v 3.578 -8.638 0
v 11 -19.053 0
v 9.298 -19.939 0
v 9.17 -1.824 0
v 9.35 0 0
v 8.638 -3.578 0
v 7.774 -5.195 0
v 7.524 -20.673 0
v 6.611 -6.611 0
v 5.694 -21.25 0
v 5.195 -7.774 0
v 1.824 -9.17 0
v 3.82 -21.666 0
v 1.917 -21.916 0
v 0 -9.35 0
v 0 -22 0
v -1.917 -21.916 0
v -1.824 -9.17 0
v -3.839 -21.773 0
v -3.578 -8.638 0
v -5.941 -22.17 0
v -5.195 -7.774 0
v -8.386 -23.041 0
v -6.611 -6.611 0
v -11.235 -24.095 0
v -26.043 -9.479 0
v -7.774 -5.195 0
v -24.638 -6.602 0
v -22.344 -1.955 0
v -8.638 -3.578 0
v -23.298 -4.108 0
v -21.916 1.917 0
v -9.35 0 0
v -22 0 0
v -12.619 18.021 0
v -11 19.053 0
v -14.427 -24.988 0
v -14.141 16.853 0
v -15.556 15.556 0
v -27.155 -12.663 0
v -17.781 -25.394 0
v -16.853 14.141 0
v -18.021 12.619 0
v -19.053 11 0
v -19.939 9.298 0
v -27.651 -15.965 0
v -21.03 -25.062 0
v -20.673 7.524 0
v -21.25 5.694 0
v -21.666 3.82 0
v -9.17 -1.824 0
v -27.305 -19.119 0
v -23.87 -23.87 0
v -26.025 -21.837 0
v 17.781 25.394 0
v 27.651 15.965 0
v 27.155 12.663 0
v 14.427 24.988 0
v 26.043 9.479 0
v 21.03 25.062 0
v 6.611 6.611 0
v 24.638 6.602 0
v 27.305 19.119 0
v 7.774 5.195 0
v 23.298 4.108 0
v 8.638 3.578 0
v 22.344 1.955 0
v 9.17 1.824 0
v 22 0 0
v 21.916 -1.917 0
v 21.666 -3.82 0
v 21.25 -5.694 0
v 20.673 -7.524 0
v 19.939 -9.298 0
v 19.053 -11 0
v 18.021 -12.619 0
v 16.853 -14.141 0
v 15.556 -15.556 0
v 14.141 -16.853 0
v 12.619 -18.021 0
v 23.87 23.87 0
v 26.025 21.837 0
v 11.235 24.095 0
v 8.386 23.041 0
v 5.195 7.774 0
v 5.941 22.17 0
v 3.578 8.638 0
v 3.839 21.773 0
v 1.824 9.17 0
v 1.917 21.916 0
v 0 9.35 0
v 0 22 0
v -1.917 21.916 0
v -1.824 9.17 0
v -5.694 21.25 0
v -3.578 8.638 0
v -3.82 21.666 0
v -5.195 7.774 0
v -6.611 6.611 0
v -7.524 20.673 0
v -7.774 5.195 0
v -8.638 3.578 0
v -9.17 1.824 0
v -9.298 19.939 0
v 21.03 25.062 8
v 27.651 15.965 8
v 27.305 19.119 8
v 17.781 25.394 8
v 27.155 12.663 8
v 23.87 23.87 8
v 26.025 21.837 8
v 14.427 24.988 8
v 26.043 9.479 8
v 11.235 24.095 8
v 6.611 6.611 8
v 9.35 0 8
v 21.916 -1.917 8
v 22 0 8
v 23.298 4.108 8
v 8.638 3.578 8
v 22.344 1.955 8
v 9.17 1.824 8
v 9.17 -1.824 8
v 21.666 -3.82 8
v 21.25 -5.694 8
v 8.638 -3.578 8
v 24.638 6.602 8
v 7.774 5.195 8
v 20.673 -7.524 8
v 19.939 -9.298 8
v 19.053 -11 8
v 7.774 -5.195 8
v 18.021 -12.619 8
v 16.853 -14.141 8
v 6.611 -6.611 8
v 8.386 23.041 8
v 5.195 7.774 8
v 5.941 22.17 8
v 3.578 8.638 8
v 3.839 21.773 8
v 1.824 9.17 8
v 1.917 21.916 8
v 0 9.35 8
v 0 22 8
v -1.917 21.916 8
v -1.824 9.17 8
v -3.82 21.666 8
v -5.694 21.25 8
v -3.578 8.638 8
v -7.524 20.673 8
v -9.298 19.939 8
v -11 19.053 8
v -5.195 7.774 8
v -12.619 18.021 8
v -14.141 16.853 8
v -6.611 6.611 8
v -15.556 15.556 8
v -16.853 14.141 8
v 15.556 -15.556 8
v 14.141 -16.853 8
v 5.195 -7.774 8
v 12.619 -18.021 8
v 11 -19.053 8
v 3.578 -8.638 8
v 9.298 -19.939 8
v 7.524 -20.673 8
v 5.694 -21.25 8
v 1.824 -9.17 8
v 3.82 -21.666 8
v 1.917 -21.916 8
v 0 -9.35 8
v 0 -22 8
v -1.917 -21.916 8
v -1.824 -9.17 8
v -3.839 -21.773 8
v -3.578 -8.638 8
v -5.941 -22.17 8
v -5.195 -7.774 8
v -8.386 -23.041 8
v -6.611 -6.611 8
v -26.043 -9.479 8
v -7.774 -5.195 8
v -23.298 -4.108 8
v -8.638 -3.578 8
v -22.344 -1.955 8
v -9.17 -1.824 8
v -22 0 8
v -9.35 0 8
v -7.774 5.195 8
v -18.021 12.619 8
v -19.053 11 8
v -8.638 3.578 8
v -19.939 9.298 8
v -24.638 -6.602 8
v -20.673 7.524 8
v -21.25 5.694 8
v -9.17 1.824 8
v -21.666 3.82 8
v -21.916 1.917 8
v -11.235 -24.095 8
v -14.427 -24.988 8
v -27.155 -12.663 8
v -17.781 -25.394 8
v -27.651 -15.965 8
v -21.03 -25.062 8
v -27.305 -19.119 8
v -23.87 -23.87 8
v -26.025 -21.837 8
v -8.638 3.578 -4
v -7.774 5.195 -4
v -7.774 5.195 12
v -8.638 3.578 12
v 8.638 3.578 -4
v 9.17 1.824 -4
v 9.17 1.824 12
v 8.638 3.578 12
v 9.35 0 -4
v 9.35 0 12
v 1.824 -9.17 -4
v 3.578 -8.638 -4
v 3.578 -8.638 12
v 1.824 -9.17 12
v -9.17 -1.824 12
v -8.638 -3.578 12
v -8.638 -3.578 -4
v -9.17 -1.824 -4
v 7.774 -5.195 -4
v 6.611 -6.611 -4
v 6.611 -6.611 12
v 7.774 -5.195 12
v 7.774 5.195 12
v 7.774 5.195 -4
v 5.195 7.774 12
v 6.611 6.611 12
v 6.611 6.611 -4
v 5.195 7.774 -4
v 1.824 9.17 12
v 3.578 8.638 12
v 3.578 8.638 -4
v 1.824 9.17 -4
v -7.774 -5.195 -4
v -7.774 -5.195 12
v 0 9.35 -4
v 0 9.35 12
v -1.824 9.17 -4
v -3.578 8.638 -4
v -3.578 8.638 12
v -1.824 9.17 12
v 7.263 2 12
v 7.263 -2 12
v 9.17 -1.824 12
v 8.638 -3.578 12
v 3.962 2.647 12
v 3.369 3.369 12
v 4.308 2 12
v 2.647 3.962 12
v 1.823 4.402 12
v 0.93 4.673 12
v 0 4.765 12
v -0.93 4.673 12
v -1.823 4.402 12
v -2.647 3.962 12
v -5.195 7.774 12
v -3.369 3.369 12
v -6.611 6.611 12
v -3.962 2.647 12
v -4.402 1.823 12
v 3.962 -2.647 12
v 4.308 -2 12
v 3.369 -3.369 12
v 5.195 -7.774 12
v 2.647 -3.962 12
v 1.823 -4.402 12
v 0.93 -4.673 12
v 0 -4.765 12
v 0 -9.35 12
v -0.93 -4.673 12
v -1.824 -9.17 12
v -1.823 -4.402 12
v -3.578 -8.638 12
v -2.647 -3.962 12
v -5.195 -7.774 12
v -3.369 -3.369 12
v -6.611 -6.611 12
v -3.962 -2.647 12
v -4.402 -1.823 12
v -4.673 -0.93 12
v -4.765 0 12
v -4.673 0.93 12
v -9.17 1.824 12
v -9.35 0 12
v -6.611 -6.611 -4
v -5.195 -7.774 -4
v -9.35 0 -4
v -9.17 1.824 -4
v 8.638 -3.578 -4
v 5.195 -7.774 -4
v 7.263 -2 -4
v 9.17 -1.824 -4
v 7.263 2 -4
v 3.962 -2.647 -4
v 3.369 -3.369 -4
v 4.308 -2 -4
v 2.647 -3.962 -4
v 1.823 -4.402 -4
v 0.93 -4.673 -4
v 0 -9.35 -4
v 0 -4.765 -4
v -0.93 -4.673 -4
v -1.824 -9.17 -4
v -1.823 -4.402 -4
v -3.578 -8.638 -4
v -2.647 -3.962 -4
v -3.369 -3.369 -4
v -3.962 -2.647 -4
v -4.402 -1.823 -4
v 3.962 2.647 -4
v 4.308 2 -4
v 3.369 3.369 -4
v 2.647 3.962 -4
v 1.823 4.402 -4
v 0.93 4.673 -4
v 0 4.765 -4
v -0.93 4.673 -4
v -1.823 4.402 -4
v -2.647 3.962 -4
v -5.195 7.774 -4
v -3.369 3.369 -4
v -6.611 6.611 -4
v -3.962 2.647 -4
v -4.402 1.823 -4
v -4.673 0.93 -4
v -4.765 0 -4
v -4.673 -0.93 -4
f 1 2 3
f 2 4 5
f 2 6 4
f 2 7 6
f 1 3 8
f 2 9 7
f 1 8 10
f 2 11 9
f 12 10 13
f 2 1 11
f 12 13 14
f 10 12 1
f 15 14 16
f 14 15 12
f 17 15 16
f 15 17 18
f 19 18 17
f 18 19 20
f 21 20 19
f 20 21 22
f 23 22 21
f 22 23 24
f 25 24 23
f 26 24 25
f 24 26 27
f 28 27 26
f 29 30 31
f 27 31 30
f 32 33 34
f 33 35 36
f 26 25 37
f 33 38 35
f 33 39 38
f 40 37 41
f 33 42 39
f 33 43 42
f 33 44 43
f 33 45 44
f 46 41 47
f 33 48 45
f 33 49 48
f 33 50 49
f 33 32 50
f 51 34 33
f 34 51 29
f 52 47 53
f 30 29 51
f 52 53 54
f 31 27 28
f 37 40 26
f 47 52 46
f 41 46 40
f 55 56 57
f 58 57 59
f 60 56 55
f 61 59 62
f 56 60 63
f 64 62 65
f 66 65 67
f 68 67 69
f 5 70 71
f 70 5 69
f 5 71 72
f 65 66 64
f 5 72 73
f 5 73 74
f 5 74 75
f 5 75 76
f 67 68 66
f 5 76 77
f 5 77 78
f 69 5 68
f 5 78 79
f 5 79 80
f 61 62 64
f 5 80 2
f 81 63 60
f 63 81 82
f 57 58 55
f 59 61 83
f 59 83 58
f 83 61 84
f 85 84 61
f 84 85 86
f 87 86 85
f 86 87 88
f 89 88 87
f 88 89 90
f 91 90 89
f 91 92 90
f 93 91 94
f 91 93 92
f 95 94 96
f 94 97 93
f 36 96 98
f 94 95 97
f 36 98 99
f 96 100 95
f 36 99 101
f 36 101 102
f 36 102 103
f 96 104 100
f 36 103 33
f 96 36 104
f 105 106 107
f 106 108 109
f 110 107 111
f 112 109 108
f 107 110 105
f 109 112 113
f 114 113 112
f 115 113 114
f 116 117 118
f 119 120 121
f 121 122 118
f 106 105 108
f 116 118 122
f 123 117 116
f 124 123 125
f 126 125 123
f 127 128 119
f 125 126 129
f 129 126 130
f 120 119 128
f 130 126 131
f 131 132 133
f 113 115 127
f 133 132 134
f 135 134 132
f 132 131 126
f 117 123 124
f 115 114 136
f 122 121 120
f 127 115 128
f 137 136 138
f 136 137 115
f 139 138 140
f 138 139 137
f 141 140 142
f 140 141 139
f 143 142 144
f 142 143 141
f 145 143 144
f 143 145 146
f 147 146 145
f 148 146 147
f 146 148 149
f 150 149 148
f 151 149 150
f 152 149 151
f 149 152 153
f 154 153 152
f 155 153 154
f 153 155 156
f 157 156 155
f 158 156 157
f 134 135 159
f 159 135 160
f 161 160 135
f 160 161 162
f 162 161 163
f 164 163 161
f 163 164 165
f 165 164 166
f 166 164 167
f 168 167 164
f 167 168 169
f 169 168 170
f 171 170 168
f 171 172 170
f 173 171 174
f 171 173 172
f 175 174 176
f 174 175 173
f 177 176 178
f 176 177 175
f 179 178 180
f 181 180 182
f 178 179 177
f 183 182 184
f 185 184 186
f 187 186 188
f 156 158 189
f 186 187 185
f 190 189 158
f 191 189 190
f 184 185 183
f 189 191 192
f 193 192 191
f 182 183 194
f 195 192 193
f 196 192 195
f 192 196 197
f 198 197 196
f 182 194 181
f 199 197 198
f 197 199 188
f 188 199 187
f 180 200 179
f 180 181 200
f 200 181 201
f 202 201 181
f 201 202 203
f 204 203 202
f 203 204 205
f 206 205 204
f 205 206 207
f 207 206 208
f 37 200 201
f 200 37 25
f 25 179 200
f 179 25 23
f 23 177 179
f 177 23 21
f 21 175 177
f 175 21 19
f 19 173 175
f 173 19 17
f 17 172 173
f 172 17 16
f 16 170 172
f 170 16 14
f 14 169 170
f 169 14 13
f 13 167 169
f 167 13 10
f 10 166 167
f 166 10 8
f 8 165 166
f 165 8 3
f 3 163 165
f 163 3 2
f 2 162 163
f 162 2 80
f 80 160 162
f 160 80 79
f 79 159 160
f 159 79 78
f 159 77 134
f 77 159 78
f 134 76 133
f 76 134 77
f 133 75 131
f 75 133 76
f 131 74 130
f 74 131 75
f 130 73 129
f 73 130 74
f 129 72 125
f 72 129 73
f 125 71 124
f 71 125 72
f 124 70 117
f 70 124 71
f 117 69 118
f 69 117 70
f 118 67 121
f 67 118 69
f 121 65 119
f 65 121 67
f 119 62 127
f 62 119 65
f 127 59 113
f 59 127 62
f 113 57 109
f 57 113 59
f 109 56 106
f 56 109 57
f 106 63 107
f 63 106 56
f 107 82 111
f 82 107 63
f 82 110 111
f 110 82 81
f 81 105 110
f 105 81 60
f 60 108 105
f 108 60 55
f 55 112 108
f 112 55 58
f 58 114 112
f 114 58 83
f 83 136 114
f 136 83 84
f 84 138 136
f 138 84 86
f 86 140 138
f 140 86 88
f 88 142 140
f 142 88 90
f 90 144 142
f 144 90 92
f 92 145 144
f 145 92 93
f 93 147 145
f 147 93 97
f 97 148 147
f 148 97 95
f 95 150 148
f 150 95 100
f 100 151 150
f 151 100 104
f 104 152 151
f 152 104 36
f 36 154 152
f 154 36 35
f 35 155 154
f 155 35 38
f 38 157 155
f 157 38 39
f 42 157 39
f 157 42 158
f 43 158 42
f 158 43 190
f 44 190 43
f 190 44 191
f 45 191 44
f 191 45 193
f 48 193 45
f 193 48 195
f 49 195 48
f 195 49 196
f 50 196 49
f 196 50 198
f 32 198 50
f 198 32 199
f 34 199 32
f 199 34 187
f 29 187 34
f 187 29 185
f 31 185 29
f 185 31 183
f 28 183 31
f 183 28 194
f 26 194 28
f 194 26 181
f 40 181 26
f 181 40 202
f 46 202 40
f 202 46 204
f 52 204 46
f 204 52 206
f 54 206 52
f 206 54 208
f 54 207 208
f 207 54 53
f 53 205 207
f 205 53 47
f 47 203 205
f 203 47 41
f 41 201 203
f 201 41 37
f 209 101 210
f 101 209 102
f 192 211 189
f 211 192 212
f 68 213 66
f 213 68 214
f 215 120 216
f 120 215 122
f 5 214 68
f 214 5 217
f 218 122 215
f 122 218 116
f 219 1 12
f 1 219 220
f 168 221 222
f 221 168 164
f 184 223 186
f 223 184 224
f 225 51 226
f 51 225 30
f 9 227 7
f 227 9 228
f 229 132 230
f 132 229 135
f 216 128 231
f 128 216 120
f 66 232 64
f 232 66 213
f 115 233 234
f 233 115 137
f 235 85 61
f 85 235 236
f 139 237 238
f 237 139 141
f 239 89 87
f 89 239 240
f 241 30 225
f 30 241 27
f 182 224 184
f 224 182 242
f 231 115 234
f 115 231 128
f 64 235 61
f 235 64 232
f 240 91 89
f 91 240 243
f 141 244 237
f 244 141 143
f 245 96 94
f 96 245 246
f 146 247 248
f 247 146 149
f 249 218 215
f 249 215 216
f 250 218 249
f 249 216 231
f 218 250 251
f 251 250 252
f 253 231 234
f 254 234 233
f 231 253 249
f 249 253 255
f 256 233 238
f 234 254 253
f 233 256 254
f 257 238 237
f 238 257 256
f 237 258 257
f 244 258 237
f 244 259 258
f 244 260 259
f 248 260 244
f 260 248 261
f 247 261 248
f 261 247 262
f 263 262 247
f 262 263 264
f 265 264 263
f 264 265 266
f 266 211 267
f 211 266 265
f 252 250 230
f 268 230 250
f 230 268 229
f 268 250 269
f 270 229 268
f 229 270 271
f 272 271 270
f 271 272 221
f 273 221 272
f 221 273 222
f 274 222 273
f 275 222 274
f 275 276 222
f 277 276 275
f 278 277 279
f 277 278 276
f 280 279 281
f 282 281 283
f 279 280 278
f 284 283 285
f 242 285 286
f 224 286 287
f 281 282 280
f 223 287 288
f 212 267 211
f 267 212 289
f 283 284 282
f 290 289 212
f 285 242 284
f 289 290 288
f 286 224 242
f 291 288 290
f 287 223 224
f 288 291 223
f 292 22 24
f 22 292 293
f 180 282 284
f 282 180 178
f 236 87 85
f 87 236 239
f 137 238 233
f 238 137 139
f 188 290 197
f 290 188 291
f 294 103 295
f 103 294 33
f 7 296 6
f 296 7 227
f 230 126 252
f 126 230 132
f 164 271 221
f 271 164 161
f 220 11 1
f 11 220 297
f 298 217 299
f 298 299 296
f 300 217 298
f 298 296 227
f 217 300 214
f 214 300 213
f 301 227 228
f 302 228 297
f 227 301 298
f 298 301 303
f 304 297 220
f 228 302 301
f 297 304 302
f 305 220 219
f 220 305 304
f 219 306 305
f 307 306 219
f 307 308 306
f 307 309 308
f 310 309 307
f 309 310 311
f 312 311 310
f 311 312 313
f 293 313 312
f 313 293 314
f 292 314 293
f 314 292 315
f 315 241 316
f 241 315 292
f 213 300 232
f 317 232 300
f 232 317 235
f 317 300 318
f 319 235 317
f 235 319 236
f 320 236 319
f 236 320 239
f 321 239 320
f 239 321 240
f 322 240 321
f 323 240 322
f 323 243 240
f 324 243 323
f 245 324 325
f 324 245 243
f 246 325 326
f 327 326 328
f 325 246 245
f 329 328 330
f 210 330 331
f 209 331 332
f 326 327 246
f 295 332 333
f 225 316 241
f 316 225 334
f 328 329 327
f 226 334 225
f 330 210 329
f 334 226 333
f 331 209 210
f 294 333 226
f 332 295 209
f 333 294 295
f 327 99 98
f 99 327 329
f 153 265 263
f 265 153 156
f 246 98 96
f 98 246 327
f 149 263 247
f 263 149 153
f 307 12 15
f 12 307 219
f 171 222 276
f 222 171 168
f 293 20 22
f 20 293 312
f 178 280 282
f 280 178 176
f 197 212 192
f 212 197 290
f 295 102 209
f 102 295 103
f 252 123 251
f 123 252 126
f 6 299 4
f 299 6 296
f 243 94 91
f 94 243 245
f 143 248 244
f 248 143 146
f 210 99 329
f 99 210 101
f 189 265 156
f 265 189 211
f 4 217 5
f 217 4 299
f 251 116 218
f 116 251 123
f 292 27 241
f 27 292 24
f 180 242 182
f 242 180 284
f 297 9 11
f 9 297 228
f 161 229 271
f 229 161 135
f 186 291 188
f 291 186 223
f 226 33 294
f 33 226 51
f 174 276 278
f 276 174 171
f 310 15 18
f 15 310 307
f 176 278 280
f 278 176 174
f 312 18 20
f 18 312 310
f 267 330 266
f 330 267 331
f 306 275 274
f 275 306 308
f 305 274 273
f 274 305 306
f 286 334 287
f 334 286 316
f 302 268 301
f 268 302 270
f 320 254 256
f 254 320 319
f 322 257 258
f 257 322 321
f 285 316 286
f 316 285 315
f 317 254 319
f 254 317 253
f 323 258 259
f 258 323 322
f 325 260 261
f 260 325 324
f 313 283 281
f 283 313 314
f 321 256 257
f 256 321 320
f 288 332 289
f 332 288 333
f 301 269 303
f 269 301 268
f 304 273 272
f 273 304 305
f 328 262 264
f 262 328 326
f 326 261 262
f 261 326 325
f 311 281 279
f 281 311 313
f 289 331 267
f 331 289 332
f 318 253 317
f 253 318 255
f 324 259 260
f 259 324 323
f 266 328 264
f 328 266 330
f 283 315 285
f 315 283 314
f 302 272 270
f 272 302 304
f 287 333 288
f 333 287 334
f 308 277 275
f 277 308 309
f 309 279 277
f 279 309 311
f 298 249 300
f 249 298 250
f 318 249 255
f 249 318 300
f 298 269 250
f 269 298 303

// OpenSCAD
$fn = 32;

// ----------------------------------------------------------------------
// Cam: base radius 22 mm with a 12 mm lift over 150 degrees
// ----------------------------------------------------------------------

// --- parameters (mm) ---
base_r = 22;              // base radius
lift = 12;                // lift height above the base radius
lift_span = 150;          // angular width of the lift
lift_start = 0;           // angle where the lift starts
cam_t = 8;                // cam plate thickness
hub_d = 18.7;             // hub diameter
hub_h = 16;               // hub height
bore_d = 9.53;            // bore
key_w = 4;                // keyway width
key_depth = 2;            // keyway depth

cam_profile = [[22, 0], [22.344, 1.955], [23.298, 4.108], [24.638, 6.602], [26.043, 9.479], [27.155, 12.663], [27.651, 15.965], [27.305, 19.119], [26.025, 21.837], [23.87, 23.87], [21.03, 25.062], [17.781, 25.394], [14.427, 24.988], [11.235, 24.095], [8.386, 23.041], [5.941, 22.17], [3.839, 21.773], [1.917, 21.916], [0, 22], [-1.917, 21.916], [-3.82, 21.666], [-5.694, 21.25], [-7.524, 20.673], [-9.298, 19.939], [-11, 19.053], [-12.619, 18.021], [-14.141, 16.853], [-15.556, 15.556], [-16.853, 14.141], [-18.021, 12.619], [-19.053, 11], [-19.939, 9.298], [-20.673, 7.524], [-21.25, 5.694], [-21.666, 3.82], [-21.916, 1.917], [-22, 0], [-22.344, -1.955], [-23.298, -4.108], [-24.638, -6.602], [-26.043, -9.479], [-27.155, -12.663], [-27.651, -15.965], [-27.305, -19.119], [-26.025, -21.837], [-23.87, -23.87], [-21.03, -25.062], [-17.781, -25.394], [-14.427, -24.988], [-11.235, -24.095], [-8.386, -23.041], [-5.941, -22.17], [-3.839, -21.773], [-1.917, -21.916], [0, -22], [1.917, -21.916], [3.82, -21.666], [5.694, -21.25], [7.524, -20.673], [9.298, -19.939], [11, -19.053], [12.619, -18.021], [14.141, -16.853], [15.556, -15.556], [16.853, -14.141], [18.021, -12.619], [19.053, -11], [19.939, -9.298], [20.673, -7.524], [21.25, -5.694], [21.666, -3.82], [21.916, -1.917]];

difference() {
  union() {
    linear_extrude(height = cam_t) polygon(cam_profile);
    /* hub, proud of the cam plate on both sides */
    translate([0, 0, -4]) cylinder(h = hub_h, d = hub_d);
  }
  /* bore through the hub, 2.5 mm clear on both faces */
  translate([0, 0, -6.5]) cylinder(h = hub_h + 5, d = bore_d);
  /* keyway, milled through the whole hub */
  translate([2.763, -2, -6.5]) cube([4.5, 4, 21]);
}
